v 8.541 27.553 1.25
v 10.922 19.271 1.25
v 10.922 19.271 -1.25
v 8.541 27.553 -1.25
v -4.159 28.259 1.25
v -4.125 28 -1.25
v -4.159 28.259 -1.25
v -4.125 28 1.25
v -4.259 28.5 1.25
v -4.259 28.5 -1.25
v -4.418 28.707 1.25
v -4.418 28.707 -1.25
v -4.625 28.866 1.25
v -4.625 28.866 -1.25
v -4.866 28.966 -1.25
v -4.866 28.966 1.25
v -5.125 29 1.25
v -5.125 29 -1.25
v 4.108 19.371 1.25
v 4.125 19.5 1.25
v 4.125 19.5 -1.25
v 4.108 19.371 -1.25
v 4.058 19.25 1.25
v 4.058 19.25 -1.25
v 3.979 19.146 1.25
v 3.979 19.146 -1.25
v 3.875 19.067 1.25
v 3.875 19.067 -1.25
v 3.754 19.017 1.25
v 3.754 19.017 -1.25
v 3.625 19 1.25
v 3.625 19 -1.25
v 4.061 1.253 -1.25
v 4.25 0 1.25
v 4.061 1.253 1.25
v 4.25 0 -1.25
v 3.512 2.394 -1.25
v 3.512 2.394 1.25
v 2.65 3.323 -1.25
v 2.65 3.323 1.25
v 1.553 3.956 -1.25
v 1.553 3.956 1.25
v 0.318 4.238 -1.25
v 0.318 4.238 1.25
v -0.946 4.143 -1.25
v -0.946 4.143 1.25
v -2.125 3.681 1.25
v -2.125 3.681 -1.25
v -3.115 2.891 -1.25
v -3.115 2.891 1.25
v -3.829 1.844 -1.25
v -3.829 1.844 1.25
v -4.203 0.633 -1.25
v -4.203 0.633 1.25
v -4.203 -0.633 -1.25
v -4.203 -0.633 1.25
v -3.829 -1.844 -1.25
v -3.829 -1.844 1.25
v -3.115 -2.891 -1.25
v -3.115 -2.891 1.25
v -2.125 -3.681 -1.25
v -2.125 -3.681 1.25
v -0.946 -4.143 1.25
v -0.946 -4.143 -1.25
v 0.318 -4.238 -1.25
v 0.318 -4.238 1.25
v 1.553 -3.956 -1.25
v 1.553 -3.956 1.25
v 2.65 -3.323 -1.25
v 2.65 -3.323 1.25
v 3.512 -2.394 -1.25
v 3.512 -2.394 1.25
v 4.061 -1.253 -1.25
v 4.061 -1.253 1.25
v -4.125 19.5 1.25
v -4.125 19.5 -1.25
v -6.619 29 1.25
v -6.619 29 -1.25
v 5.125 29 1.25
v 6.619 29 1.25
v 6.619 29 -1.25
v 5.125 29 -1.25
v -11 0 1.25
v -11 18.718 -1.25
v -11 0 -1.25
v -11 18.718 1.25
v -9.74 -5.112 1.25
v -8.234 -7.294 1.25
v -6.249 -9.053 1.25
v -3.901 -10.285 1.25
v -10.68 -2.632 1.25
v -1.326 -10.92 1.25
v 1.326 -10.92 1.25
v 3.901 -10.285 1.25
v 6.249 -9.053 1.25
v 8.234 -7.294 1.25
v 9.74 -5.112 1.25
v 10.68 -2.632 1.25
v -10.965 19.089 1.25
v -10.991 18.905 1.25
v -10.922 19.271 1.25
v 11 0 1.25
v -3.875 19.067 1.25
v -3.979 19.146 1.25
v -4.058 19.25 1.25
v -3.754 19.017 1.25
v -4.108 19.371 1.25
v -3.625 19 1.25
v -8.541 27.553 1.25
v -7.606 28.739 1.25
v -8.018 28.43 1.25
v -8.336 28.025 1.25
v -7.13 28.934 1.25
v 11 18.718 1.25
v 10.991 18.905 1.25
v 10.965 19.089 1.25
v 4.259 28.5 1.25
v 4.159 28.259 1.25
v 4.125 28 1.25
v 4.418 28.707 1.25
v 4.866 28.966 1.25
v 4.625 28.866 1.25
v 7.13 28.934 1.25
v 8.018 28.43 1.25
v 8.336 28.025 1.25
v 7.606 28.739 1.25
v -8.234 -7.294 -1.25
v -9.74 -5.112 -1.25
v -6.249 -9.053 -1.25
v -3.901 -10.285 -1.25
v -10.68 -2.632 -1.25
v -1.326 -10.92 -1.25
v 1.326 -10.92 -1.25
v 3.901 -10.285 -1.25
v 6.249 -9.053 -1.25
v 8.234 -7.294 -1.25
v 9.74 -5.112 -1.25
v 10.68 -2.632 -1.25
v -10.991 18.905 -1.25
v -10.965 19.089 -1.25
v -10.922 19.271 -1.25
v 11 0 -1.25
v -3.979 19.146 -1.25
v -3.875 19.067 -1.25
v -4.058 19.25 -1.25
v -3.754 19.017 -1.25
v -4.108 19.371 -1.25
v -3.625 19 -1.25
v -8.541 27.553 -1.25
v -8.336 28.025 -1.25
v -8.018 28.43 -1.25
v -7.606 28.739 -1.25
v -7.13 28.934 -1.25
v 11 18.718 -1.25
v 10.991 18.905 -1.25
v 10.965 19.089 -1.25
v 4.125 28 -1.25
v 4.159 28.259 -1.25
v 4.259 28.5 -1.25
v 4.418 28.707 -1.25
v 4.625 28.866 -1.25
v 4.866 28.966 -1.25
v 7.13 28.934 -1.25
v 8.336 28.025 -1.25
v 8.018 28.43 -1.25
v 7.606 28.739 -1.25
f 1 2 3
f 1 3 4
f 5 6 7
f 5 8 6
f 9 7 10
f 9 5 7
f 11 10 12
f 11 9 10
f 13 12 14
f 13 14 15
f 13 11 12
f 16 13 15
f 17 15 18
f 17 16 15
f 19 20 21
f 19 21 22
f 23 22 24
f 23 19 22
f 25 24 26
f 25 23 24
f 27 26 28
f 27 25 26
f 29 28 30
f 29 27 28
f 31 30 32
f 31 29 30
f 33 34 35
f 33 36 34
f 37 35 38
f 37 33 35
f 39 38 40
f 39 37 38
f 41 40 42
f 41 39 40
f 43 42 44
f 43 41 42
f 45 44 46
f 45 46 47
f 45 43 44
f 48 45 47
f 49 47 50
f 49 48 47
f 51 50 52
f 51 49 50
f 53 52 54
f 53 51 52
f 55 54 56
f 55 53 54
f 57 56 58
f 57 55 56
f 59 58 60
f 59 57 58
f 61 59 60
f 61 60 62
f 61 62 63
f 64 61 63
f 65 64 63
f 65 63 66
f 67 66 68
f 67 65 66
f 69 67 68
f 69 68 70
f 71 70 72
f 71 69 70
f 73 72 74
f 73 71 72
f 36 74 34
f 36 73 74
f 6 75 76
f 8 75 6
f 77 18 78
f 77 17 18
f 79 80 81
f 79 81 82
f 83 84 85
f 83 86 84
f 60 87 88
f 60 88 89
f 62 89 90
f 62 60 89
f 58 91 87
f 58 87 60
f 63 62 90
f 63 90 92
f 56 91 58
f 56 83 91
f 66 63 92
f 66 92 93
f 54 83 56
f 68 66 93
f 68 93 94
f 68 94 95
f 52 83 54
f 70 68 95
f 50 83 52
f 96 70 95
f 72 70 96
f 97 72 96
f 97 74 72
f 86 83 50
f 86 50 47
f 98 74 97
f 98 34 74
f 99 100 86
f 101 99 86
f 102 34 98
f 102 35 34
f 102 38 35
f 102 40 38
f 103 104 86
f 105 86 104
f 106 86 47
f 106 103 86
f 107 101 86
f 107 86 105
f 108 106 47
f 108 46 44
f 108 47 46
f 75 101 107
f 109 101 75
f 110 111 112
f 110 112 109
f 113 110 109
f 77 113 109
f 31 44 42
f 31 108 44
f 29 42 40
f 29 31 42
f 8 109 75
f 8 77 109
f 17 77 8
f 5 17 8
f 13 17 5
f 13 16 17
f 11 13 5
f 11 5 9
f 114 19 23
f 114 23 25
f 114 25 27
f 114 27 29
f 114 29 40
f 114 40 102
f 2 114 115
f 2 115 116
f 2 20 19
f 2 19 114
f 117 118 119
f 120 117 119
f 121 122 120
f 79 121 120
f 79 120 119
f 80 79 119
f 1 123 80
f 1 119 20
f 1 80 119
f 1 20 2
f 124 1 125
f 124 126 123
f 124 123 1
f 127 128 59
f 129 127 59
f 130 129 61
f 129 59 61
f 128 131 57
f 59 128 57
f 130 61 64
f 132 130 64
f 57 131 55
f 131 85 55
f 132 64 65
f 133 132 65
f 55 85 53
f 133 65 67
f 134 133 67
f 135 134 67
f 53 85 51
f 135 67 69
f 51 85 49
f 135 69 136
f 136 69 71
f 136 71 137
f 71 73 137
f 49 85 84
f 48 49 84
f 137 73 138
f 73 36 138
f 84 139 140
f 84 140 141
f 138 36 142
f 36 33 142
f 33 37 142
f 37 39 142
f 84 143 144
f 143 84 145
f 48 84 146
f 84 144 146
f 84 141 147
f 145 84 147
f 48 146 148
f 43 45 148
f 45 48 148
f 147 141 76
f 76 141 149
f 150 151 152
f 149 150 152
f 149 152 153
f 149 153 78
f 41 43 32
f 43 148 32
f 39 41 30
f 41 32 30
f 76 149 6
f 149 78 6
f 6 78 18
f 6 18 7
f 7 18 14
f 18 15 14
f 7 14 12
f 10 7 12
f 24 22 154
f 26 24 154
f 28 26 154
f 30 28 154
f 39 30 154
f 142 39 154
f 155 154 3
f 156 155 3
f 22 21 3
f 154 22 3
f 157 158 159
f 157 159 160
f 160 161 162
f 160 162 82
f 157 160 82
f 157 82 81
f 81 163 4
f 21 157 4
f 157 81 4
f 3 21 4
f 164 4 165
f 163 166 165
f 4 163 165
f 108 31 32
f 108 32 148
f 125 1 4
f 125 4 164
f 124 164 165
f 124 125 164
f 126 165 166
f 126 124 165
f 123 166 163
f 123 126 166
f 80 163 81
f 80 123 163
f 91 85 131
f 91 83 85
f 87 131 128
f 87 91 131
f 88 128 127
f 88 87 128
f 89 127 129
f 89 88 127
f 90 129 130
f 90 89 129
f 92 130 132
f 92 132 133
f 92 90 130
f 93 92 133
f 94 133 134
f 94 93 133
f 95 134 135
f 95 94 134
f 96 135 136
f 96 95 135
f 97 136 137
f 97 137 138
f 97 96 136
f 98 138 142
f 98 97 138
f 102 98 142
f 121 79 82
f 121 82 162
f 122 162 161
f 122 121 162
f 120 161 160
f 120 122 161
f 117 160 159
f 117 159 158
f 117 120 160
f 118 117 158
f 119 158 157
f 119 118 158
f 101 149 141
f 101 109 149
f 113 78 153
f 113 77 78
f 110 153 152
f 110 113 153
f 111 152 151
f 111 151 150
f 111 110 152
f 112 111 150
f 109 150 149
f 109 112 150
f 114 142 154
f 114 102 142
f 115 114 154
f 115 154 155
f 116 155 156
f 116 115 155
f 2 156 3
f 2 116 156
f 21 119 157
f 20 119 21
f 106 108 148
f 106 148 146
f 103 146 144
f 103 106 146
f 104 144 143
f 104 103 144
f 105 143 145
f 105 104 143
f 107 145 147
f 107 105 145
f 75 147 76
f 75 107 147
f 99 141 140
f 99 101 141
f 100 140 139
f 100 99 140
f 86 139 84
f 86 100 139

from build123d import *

# Parameters (mm, degrees)
SKETCH1_R      = 4.25
EXTRUDE1_DEPTH = 1.25


with BuildPart() as part:
    # Sketch1 → Extrude1 (new body, symmetric)
    with BuildSketch(Plane.XY):
        with BuildLine():
            Line((11, 0), (11, 18.718207384))
            ThreePointArc((11, 18.718207384), (10.980438994, 18.997243926), (10.922138608, 19.270822234))
            Line((10.922138608, 19.270822234), (8.541123231, 27.55261485))
            ThreePointArc((8.541123231, 27.55261485), (7.822057834, 28.597690474), (6.618984623, 29))
            Line((6.618984623, 29), (5.125, 29))
            ThreePointArc((5.125, 29), (4.417893219, 28.707106781), (4.125, 28))
            Line((4.125, 28), (4.125, 19.5))
            ThreePointArc((4.125, 19.5), (3.978553391, 19.146446609), (3.625, 19))
            Line((3.625, 19), (-3.625, 19))
            ThreePointArc((-3.625, 19), (-3.978553391, 19.146446609), (-4.125, 19.5))
            Line((-4.125, 19.5), (-4.125, 28))
            ThreePointArc((-4.125, 28), (-4.417893219, 28.707106781), (-5.125, 29))
            Line((-5.125, 29), (-6.618984623, 29))
            ThreePointArc((-6.618984623, 29), (-7.822057834, 28.597690474), (-8.541123231, 27.55261485))
            Line((-8.541123231, 27.55261485), (-10.922138608, 19.270822234))
            ThreePointArc((-10.922138608, 19.270822234), (-10.980438994, 18.997243926), (-11, 18.718207384))
            Line((-11, 18.718207384), (-11, 0))
            ThreePointArc((-11, 0), (0, -11), (11, 0))
        make_face()
        Circle(SKETCH1_R, mode=Mode.SUBTRACT)
    extrude(amount=EXTRUDE1_DEPTH, both=True)


solid = part.part
